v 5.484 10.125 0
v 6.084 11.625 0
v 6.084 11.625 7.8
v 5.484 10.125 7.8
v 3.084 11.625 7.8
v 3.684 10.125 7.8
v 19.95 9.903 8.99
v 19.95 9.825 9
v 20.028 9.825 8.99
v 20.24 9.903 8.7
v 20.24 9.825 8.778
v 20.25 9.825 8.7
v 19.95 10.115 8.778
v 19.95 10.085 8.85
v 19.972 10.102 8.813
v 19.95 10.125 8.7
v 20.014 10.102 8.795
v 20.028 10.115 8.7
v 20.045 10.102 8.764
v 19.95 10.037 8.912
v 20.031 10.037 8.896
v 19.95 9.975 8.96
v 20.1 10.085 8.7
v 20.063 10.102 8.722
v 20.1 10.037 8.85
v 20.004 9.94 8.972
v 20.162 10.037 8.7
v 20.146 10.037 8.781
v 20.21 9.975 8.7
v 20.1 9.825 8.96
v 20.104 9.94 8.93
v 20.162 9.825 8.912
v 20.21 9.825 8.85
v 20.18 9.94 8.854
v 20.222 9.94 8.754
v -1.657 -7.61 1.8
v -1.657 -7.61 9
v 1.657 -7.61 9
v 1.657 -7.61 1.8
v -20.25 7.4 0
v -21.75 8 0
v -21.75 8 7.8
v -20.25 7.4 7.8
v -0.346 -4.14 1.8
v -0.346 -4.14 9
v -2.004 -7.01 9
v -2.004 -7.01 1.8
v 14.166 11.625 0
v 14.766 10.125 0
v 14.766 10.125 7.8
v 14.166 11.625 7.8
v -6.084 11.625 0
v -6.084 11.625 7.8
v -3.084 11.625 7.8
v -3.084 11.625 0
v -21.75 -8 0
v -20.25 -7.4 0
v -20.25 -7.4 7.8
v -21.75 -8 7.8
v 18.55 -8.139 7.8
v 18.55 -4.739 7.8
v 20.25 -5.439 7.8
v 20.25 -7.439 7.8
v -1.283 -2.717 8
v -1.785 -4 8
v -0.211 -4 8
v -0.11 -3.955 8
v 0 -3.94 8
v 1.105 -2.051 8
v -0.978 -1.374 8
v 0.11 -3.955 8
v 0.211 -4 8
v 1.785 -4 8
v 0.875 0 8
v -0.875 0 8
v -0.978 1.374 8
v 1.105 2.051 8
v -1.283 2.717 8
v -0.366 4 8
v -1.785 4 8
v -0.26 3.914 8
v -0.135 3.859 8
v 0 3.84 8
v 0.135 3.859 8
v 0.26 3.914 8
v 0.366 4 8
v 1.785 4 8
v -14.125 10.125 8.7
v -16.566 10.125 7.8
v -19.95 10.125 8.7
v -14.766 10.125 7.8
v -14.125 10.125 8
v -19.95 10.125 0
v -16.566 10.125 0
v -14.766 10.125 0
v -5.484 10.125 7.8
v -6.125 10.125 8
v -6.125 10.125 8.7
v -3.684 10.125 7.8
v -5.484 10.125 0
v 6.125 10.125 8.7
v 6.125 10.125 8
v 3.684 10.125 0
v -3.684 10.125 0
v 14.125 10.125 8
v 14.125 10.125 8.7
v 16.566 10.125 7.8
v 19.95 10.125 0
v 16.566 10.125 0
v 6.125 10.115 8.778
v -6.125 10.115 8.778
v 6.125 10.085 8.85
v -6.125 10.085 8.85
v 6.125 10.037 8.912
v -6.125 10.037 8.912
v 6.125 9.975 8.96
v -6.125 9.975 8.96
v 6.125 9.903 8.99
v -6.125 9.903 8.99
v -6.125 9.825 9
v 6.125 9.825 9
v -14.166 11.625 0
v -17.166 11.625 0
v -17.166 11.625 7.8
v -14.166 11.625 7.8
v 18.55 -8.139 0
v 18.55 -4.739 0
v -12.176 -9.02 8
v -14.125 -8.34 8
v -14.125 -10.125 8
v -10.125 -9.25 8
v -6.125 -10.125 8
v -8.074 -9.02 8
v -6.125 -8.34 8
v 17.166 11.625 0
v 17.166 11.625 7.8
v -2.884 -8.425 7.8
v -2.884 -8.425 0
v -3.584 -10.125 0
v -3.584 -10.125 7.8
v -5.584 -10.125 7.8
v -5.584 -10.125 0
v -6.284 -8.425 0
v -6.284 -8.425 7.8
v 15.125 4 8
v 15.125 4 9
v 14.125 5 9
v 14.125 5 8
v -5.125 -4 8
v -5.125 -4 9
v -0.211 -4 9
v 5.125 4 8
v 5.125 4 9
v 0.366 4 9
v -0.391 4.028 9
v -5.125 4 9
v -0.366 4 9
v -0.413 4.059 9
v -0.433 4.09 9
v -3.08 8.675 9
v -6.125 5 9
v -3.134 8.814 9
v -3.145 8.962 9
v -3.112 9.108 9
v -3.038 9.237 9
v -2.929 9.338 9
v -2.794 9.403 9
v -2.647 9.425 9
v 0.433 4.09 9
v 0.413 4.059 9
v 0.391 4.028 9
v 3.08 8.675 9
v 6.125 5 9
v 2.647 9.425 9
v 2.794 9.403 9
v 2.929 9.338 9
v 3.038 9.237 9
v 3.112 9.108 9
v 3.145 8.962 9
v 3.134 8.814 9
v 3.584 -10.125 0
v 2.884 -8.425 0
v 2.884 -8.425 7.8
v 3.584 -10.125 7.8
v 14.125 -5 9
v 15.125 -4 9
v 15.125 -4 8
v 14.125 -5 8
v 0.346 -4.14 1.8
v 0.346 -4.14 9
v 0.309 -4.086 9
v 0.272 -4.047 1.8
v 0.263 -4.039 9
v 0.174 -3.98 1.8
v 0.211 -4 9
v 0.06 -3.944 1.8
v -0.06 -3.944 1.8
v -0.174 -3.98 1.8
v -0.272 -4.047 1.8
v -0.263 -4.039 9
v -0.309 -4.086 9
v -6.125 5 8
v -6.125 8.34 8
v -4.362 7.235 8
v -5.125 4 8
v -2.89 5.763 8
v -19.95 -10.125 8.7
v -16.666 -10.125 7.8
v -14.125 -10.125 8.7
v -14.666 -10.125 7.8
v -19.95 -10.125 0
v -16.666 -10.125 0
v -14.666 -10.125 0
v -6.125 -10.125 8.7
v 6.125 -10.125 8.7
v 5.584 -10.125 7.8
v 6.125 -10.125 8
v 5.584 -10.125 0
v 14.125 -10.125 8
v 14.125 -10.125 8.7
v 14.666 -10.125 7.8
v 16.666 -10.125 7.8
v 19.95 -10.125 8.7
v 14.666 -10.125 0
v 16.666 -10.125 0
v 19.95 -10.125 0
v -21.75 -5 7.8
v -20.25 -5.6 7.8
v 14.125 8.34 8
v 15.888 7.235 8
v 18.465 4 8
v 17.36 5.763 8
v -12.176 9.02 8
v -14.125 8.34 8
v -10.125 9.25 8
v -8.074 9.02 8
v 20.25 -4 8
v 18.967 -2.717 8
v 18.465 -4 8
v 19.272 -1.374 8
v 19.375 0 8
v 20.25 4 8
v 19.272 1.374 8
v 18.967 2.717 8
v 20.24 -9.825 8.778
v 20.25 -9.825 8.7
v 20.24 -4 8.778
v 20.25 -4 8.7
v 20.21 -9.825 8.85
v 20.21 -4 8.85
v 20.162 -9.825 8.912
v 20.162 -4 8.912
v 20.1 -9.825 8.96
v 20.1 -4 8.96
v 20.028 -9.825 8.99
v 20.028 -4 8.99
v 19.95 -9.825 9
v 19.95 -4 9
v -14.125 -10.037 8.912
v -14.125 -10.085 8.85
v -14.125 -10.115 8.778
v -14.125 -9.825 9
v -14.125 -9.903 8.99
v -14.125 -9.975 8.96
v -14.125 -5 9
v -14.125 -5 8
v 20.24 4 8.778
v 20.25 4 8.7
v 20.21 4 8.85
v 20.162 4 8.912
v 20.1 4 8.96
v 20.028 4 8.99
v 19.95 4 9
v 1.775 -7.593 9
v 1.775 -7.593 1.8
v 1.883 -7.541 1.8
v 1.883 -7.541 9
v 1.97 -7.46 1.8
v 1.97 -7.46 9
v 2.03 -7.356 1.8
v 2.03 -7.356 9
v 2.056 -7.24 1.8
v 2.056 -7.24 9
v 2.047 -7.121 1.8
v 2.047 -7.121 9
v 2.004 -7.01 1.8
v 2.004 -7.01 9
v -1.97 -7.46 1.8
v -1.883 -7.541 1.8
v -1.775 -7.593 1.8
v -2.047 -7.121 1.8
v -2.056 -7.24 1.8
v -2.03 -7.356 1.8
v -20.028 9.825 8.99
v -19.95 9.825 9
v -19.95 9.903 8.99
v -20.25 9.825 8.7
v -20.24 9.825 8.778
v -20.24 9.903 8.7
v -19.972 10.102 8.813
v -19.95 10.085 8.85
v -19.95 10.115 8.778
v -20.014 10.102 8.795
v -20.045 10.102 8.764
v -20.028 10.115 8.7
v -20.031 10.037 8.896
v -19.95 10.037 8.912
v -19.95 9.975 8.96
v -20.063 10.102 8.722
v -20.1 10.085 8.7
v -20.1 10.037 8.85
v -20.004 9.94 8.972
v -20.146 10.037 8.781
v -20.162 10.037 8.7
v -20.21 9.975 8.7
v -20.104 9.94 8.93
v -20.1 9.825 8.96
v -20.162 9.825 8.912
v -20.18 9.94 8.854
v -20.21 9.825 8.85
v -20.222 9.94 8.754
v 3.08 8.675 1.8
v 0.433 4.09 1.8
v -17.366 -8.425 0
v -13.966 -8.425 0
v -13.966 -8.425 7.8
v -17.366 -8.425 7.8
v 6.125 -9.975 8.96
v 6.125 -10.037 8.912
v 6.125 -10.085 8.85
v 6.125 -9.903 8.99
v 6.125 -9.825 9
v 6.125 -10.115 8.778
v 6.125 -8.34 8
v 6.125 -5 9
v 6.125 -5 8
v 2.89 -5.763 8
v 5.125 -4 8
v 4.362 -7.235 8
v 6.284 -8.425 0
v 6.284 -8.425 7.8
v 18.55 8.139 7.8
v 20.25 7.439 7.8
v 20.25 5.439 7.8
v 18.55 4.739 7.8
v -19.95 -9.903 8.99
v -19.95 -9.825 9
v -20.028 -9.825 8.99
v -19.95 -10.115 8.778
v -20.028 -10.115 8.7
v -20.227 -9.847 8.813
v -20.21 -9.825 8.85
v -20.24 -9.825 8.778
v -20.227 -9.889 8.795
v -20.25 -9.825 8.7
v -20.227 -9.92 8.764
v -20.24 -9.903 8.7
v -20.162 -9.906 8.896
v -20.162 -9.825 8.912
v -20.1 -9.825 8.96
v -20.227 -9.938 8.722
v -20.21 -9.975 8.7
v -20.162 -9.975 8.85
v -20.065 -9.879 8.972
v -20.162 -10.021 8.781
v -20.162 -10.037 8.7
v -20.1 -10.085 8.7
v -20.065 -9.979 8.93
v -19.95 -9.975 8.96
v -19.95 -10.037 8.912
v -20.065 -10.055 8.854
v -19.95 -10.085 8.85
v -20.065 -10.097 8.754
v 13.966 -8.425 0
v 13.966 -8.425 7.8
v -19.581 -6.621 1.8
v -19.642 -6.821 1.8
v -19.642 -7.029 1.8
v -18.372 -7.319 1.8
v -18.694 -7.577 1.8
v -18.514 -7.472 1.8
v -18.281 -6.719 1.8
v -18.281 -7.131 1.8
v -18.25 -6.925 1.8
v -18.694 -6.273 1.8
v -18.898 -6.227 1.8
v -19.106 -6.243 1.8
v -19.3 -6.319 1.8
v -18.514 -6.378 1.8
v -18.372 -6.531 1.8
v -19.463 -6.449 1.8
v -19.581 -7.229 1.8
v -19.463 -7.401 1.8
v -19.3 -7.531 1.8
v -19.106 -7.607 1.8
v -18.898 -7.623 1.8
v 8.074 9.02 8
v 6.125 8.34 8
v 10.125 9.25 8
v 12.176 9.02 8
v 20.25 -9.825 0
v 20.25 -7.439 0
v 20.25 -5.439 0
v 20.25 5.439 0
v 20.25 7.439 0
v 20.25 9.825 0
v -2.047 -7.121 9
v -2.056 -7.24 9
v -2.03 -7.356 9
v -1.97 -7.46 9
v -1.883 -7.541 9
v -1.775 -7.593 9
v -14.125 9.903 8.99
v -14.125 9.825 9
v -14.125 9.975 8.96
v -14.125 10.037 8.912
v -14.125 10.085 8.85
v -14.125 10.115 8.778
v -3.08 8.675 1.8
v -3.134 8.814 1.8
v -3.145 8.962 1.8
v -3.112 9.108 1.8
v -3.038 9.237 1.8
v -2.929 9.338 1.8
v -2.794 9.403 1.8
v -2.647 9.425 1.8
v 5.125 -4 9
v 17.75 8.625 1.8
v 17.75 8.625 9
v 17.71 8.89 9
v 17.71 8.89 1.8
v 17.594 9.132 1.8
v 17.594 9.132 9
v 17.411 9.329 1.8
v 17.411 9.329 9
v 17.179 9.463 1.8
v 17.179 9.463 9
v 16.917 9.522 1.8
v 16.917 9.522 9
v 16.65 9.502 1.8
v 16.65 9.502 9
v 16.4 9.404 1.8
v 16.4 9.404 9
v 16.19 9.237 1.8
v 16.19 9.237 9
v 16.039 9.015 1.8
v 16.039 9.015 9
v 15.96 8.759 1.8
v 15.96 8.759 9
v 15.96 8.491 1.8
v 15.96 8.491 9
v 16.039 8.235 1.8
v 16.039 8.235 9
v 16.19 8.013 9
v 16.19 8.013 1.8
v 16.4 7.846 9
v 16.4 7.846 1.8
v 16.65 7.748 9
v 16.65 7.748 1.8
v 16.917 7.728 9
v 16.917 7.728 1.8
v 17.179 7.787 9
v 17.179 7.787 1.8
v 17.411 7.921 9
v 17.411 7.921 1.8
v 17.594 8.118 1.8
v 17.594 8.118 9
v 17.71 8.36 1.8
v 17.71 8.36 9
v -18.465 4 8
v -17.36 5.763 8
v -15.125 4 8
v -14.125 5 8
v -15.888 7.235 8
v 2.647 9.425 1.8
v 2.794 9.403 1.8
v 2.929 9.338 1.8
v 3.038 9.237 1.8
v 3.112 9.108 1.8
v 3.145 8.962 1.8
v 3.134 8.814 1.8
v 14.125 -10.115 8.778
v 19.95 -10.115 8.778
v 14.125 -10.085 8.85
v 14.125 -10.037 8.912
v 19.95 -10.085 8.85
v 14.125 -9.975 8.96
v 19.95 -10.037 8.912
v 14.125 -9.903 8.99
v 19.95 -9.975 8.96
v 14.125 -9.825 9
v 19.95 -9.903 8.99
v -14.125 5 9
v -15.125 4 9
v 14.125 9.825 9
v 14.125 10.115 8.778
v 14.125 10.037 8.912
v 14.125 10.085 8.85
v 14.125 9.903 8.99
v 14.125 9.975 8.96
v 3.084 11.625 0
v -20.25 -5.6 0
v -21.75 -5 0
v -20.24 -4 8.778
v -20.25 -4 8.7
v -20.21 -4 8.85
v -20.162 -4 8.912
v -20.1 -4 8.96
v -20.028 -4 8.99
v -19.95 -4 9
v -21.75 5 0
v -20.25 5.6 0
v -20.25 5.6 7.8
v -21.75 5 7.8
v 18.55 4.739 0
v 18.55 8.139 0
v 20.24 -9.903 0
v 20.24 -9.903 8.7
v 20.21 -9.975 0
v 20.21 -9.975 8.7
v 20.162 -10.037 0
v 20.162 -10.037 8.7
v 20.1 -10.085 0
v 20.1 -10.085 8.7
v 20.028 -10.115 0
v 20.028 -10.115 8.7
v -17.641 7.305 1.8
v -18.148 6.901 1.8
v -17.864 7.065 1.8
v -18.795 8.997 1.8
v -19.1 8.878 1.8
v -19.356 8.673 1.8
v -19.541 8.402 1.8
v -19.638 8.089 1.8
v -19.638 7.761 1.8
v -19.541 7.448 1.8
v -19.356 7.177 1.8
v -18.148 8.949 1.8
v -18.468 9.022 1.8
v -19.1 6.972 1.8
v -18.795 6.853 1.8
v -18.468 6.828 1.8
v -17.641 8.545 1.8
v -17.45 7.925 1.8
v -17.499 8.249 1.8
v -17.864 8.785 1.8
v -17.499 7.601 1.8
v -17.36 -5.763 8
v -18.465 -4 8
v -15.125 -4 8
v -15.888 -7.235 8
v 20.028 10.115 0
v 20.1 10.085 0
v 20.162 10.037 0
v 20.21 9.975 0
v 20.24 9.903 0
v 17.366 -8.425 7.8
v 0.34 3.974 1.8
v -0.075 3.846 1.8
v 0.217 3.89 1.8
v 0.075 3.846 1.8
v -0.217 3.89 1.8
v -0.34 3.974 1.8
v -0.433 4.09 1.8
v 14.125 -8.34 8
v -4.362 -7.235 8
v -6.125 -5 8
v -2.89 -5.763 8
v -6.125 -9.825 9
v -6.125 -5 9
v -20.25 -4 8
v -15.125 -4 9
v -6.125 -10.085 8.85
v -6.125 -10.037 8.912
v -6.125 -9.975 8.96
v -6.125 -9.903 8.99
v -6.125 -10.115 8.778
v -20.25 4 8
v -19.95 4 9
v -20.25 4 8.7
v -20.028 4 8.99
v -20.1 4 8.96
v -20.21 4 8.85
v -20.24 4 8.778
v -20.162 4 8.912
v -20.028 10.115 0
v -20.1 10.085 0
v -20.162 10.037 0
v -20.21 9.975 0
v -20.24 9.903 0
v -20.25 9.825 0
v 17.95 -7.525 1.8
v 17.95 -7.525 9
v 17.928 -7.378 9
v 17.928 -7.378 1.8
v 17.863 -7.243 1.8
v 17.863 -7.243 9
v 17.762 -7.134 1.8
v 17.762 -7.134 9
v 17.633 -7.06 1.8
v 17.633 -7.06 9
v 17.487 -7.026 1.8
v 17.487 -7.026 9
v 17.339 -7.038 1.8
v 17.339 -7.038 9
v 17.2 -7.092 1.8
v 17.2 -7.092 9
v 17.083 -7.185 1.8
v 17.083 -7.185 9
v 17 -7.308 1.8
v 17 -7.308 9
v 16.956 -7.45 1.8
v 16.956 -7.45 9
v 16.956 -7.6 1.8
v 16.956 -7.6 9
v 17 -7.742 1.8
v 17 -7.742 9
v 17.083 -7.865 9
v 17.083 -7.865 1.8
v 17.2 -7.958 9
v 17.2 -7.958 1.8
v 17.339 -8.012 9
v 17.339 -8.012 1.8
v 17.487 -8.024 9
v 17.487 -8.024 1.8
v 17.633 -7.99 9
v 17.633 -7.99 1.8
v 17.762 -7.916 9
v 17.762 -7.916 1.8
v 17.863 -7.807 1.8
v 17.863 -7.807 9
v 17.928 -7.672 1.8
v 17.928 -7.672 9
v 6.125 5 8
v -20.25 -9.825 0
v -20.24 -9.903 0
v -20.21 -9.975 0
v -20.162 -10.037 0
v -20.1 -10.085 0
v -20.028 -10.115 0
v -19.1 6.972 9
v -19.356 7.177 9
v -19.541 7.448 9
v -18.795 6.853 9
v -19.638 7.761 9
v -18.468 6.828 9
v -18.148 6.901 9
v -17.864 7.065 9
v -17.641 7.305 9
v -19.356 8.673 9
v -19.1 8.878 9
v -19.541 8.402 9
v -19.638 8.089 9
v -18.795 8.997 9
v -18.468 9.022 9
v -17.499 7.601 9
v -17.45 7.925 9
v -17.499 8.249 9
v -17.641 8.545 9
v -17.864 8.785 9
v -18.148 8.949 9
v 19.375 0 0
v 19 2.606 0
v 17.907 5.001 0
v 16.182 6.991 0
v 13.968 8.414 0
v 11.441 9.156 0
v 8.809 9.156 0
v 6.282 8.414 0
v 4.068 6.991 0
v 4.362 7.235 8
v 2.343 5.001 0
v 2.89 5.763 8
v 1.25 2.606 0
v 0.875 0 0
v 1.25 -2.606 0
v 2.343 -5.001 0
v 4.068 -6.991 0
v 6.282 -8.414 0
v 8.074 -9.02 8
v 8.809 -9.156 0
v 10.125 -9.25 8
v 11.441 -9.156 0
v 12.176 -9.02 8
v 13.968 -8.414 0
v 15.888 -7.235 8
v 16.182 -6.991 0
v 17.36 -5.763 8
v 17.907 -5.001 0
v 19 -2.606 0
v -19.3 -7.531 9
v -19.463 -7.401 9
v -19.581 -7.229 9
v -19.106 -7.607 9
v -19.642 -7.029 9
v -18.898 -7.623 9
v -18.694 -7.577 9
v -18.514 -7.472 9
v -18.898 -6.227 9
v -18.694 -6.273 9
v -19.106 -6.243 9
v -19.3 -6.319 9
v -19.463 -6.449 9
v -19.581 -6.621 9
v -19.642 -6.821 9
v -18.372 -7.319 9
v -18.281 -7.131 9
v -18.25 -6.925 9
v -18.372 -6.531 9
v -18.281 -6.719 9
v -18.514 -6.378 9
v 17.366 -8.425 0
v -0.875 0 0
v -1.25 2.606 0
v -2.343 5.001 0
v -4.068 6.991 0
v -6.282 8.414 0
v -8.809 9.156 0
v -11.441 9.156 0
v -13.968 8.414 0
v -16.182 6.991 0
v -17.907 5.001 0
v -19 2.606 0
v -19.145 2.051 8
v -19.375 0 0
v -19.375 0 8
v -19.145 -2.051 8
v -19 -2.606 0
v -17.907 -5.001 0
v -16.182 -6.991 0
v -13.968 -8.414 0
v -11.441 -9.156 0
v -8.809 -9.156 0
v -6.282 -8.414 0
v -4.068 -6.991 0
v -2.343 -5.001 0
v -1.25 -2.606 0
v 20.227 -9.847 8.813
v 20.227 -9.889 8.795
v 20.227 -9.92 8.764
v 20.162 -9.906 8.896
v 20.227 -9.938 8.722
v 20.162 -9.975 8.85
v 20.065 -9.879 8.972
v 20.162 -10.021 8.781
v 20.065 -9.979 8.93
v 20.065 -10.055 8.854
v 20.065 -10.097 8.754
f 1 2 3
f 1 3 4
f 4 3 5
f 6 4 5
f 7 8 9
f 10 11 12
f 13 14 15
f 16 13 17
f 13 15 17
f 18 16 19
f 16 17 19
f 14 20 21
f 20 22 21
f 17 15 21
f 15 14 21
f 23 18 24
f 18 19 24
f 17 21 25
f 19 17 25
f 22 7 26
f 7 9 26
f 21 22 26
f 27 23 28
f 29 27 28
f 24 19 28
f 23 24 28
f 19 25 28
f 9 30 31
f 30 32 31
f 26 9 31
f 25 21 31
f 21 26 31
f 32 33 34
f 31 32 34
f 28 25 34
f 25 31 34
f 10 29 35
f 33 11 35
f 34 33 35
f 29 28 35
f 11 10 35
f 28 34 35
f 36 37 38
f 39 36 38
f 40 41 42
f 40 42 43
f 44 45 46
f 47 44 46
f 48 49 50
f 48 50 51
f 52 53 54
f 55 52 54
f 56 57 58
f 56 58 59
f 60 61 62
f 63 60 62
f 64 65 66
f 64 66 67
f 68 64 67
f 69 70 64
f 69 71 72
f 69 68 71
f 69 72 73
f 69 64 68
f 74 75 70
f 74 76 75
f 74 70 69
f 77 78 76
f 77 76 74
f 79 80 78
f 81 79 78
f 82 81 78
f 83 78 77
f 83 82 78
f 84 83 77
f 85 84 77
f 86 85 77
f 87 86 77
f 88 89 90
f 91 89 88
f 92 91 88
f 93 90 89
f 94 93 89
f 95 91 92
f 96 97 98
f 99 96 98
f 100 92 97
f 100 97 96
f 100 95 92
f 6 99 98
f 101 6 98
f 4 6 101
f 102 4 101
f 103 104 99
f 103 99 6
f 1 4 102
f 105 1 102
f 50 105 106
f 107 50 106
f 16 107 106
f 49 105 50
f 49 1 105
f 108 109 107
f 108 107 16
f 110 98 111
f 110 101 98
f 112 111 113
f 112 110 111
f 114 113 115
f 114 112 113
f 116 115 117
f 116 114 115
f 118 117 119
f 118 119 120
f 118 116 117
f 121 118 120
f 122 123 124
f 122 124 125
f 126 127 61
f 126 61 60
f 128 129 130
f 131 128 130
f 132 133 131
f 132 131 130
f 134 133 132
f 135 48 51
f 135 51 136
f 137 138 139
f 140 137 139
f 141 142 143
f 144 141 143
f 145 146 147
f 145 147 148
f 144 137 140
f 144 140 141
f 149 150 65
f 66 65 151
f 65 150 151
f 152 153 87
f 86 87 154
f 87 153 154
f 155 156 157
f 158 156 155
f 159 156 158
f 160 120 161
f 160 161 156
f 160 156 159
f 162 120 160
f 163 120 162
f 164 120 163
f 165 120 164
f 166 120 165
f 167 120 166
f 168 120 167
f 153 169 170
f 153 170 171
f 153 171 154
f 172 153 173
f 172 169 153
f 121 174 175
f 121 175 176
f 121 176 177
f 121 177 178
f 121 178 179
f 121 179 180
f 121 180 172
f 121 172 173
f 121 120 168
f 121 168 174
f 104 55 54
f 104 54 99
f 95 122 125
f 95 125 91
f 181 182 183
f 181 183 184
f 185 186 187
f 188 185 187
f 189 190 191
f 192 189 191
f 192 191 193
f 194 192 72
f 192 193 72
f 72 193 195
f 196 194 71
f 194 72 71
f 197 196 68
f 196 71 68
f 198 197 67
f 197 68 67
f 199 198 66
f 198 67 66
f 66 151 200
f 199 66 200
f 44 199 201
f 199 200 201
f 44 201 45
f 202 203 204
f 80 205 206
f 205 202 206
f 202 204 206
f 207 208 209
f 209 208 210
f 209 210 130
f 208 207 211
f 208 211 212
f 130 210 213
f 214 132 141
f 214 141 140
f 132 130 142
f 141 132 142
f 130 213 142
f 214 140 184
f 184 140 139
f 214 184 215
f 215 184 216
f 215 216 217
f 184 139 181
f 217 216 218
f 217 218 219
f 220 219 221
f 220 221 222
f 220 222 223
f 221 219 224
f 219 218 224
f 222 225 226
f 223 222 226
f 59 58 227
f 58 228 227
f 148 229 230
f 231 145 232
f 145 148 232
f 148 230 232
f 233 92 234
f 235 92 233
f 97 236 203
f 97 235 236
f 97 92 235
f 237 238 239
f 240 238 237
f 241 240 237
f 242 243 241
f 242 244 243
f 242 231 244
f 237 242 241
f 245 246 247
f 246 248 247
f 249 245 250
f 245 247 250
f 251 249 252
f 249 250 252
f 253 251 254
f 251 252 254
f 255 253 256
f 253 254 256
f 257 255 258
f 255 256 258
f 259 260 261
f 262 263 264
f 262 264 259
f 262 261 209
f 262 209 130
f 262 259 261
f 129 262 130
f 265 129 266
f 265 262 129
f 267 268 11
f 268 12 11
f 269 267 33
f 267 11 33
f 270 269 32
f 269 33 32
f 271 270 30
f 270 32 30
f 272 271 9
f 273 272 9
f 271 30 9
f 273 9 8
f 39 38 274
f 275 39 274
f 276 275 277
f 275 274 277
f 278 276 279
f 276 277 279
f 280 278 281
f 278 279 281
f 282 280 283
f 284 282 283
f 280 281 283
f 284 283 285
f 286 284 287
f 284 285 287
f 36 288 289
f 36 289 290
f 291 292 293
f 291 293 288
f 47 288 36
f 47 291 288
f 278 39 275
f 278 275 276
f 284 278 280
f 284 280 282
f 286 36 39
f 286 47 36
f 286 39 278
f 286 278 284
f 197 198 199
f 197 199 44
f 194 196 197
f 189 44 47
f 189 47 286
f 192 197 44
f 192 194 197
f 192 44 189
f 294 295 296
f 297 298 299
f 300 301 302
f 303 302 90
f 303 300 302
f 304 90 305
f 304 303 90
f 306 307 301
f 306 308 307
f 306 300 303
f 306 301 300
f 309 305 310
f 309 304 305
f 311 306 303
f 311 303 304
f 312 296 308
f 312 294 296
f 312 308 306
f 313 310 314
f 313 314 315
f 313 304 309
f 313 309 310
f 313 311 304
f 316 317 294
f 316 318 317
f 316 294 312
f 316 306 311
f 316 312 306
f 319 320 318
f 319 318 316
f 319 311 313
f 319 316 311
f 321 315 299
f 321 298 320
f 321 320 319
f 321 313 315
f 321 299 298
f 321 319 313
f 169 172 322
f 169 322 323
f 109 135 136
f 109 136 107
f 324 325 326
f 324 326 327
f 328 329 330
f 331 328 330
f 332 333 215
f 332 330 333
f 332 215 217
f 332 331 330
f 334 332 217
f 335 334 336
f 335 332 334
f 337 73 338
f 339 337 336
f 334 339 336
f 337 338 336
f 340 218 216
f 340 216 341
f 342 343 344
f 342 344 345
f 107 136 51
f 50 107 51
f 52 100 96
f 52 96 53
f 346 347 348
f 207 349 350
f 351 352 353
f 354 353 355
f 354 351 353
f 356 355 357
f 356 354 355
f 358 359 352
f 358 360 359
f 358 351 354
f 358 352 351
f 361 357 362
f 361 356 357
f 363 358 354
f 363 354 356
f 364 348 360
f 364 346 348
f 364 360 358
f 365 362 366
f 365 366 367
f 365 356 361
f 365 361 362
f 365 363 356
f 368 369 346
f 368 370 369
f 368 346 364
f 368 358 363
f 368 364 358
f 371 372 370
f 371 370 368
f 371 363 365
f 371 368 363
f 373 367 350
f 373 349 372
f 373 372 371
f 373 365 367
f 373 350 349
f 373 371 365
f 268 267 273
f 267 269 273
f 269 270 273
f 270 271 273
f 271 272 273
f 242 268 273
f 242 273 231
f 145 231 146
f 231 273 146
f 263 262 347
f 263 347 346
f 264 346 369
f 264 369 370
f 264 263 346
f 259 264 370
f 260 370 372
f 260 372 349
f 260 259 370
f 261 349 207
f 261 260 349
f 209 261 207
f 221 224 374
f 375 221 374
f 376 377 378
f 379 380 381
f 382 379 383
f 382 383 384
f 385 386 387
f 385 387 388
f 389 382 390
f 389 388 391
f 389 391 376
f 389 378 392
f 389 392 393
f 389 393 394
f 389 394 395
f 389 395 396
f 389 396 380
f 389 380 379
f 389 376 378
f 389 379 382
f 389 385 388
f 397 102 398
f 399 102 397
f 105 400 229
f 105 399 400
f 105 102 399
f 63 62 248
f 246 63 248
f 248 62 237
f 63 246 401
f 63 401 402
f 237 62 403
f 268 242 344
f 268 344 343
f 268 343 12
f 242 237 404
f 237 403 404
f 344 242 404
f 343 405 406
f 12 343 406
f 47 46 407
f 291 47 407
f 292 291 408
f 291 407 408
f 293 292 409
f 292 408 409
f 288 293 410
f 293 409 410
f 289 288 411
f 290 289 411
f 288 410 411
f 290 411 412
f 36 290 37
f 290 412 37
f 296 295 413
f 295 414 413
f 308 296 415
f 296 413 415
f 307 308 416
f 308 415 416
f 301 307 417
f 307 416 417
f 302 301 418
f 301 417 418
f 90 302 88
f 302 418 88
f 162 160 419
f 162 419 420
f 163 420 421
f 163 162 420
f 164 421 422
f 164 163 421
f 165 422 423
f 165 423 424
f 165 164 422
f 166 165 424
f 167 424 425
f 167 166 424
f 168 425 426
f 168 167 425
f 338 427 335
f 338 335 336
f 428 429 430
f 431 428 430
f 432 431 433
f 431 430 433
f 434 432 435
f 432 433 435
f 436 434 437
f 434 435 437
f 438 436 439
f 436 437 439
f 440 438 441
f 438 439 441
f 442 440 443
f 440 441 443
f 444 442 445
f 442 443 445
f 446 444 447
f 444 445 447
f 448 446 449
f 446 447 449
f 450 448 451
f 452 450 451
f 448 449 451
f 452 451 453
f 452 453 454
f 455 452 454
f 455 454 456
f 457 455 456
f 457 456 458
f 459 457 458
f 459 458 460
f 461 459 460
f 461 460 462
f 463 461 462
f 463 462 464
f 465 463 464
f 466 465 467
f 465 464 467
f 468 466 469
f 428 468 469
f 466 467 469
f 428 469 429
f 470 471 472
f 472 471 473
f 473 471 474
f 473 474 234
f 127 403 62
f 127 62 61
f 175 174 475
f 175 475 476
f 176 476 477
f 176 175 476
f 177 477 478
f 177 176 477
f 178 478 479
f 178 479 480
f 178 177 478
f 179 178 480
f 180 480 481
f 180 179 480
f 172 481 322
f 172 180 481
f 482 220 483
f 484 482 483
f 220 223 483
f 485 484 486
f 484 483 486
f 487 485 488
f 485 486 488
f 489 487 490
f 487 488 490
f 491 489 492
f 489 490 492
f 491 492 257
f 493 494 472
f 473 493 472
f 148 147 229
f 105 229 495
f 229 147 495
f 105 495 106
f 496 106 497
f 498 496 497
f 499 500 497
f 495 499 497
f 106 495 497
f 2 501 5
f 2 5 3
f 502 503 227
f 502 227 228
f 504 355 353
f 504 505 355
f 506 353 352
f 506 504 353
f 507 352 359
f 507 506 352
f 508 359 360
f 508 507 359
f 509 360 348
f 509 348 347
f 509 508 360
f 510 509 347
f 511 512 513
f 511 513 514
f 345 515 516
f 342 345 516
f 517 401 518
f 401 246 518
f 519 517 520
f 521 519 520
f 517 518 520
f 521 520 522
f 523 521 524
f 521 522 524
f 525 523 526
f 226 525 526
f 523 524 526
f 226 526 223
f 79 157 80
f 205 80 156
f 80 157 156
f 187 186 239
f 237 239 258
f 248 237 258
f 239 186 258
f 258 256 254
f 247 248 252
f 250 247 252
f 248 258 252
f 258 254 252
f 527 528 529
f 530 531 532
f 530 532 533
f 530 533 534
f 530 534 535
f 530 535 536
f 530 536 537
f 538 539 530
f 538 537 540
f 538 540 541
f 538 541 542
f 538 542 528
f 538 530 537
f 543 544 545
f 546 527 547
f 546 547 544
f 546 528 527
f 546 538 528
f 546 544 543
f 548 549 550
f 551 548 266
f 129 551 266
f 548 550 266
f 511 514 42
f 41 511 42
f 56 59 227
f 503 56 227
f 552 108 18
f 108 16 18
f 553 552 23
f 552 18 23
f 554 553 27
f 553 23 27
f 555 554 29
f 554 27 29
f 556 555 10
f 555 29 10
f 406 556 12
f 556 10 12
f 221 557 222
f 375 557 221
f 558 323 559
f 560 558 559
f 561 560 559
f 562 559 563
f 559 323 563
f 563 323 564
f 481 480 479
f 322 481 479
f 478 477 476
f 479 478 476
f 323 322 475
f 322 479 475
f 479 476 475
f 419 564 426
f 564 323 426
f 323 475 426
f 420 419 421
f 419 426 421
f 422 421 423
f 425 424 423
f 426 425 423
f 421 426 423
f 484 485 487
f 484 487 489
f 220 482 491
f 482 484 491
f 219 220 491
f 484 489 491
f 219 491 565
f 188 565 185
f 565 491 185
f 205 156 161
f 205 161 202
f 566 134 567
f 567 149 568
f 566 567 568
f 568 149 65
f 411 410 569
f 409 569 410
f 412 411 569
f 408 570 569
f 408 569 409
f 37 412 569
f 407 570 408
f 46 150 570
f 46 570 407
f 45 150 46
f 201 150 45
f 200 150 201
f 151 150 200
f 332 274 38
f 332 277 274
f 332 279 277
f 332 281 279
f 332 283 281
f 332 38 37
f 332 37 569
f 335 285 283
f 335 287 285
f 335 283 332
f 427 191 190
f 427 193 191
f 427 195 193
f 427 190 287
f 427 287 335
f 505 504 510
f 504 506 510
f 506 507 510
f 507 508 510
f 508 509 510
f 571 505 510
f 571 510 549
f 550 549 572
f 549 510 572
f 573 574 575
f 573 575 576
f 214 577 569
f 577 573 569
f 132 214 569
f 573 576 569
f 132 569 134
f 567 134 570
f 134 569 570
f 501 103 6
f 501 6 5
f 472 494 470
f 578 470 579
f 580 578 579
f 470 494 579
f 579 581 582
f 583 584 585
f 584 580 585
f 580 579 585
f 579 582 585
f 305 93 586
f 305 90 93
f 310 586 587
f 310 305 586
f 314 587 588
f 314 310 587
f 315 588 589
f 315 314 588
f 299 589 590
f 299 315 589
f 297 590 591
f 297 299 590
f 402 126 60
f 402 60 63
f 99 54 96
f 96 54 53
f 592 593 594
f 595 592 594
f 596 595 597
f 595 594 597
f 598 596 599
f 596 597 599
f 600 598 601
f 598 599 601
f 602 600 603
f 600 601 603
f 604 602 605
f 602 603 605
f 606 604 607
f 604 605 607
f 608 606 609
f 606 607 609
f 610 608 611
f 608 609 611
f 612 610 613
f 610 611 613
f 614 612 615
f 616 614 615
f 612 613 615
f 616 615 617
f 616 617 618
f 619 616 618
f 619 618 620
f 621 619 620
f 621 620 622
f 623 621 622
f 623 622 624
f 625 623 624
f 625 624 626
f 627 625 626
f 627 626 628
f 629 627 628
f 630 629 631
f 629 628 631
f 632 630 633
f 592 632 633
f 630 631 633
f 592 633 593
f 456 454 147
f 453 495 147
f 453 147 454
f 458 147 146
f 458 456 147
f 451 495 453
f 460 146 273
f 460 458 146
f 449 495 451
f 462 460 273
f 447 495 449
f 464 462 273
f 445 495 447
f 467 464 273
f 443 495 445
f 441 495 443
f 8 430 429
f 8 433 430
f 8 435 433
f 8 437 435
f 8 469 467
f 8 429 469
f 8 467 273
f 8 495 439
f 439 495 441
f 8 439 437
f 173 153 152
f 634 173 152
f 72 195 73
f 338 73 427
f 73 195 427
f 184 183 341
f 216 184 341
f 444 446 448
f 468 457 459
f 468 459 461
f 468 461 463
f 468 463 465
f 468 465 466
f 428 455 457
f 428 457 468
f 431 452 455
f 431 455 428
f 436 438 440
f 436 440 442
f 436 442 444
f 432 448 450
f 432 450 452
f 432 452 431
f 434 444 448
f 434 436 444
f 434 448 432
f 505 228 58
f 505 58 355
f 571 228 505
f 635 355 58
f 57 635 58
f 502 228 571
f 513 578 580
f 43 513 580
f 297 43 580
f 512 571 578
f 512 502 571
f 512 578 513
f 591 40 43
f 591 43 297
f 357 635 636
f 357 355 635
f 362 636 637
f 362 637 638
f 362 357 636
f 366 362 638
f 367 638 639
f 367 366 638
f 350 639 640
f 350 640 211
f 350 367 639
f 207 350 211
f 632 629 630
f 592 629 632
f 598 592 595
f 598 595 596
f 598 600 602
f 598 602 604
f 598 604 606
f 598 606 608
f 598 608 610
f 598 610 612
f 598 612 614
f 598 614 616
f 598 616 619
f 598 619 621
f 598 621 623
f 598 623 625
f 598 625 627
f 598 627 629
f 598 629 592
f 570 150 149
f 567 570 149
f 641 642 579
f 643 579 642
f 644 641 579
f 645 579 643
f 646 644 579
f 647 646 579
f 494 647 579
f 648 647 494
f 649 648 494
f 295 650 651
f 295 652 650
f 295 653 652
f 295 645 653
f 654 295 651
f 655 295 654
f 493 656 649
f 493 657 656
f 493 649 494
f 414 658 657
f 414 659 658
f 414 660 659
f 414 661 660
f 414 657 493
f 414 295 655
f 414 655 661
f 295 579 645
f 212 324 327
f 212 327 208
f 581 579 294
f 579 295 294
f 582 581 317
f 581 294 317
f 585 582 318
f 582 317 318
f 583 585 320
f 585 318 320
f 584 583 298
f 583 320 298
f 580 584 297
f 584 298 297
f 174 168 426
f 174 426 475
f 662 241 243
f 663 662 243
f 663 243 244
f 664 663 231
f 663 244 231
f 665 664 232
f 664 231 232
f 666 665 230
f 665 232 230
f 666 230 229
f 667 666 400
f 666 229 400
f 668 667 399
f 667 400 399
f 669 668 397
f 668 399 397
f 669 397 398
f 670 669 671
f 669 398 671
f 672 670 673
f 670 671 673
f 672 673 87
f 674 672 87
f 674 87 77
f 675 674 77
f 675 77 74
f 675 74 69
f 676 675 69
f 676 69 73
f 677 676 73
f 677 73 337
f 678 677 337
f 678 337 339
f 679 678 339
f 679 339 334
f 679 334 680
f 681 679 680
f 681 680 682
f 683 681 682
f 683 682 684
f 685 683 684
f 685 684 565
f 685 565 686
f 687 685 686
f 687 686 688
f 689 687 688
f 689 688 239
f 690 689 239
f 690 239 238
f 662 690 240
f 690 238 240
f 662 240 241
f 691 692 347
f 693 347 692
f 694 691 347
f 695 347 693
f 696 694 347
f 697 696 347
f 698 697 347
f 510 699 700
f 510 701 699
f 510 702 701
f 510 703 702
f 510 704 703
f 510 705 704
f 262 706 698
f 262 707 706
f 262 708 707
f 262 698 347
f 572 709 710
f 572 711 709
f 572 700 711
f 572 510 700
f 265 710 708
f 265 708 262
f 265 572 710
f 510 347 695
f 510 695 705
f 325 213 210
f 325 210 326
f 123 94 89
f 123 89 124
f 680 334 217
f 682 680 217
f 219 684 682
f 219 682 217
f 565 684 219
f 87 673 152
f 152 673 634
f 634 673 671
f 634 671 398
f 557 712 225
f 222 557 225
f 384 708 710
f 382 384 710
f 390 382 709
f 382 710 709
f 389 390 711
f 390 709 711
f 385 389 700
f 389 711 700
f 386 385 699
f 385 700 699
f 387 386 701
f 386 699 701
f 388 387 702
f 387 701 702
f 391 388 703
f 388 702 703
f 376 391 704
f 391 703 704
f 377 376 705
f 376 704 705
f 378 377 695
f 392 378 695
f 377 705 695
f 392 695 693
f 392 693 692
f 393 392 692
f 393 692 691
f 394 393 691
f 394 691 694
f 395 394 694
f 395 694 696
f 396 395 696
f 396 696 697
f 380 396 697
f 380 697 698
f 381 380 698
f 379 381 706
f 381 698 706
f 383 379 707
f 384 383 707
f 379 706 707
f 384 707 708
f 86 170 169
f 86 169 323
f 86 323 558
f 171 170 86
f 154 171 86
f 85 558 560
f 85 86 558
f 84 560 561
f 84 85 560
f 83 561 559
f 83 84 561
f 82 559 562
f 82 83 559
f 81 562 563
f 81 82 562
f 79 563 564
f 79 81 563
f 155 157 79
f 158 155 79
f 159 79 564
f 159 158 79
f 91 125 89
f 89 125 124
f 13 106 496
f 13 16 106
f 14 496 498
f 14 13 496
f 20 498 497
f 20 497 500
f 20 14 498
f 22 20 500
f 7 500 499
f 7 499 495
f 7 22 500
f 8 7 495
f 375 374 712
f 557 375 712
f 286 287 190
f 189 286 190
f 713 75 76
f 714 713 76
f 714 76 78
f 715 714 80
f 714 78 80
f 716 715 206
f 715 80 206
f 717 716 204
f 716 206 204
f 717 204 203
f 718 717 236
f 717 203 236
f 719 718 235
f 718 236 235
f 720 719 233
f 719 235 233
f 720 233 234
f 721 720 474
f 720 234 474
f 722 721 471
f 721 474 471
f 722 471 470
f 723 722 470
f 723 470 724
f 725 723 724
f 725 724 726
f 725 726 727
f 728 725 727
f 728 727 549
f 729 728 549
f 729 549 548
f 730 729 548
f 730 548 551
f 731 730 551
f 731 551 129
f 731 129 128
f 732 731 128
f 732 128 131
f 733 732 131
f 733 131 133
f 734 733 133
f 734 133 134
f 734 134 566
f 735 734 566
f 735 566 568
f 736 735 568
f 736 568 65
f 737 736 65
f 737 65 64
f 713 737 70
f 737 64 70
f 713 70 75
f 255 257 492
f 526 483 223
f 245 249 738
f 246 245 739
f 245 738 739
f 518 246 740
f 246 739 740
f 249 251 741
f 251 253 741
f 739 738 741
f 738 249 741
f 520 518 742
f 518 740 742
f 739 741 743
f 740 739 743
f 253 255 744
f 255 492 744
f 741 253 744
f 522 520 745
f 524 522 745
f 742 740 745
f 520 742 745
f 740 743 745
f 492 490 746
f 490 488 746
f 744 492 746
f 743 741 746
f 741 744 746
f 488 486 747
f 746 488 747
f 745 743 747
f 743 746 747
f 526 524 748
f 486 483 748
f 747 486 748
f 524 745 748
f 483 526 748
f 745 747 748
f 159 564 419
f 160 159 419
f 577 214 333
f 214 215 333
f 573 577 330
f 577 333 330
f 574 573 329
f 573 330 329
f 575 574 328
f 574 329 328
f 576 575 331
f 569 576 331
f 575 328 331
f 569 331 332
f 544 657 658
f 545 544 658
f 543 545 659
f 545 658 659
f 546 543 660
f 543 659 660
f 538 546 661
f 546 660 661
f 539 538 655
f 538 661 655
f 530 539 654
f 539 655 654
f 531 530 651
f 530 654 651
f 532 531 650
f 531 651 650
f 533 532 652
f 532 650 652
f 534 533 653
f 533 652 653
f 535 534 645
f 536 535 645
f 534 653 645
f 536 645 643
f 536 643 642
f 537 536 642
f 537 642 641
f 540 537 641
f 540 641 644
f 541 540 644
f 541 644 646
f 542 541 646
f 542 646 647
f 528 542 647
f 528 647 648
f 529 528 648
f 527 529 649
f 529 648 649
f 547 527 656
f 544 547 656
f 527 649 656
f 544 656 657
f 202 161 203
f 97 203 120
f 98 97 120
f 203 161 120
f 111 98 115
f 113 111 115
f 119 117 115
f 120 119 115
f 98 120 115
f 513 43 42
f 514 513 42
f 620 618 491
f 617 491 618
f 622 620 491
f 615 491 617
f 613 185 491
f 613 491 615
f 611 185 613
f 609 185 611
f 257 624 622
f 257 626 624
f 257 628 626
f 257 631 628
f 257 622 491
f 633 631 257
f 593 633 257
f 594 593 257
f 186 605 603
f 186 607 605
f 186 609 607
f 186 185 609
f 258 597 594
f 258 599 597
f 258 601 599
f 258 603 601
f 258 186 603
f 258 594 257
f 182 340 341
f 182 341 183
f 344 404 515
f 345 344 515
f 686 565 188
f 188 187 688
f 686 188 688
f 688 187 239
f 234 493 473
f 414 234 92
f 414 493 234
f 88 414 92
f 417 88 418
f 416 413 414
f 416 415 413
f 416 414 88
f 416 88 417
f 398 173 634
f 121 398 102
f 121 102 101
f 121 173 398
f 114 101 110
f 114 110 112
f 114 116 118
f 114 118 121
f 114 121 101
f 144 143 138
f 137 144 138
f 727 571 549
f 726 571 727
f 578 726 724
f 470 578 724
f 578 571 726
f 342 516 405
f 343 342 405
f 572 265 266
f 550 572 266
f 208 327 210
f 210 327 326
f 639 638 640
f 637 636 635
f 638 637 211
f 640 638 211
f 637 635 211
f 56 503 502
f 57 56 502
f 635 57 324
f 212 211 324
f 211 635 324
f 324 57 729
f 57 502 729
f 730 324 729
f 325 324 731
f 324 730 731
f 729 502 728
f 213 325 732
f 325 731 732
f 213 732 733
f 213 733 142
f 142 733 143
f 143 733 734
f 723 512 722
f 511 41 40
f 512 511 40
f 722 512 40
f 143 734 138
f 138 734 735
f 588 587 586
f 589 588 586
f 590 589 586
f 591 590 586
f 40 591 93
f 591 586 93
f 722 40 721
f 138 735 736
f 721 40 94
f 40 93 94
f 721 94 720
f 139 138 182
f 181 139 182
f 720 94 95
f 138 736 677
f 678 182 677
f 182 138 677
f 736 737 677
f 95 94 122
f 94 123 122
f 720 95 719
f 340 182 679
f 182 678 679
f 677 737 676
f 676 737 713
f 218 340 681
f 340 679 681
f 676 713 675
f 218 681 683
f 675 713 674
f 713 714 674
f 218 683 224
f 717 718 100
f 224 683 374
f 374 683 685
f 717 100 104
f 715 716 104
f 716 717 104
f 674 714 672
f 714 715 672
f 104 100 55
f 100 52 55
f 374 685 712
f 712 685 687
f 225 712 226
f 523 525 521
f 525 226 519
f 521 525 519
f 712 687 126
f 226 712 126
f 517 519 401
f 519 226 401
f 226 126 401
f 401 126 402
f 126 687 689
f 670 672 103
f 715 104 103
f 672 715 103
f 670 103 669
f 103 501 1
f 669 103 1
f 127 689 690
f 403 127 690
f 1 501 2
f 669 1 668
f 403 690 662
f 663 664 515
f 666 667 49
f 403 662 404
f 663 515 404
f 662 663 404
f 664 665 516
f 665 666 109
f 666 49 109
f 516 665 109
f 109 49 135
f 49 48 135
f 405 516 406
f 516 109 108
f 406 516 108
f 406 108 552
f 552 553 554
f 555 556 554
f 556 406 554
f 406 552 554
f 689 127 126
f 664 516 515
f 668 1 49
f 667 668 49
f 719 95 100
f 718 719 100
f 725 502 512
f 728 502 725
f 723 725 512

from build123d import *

# Parameters (mm, degrees)
SKETCH_1_W          = 40.5
SKETCH_1_H          = 20.25
EXTRUDE_1_DEPTH     = 9
CUT_EXTRUDE_START   = -1
SKETCH_2_R          = 9.25
CUT_EXTRUDE_1_DEPTH = 9
SKETCH_3_W          = 6.125
SKETCH_3_H          = 8
SKETCH_3_W_2        = 8
SKETCH_3_W_3        = 12.25
SKETCH_3_H_2        = 6.125
CUT_EXTRUDE_2_DEPTH = 1
CHAMFER_1_SIZE      = 1
SKETCH_4_R          = 1.1
SKETCH_4_R_2        = 0.7
SKETCH_4_R_3        = 0.9
SKETCH_4_R_4        = 0.5
CUT_EXTRUDE_3_DEPTH = 7.2
EXTRUDE_2_DEPTH     = 7.8
CUT_EXTRUDE_4_DEPTH = 7.8
FILLET_1_R          = 0.3


with BuildPart() as part:
    # Эскиз1 → Бобышка-Вытянуть1 (new body)
    with BuildSketch(Plane.XY):
        Rectangle(SKETCH_1_W, SKETCH_1_H)
    extrude(amount=EXTRUDE_1_DEPTH)

    # Эскиз2 → Вырез-Вытянуть1 (cut)
    with BuildSketch(Plane.XY.offset(9).offset(CUT_EXTRUDE_START)):
        with Locations((-10.125, 0)):
            Circle(SKETCH_2_R)
        with Locations((10.125, 0)):
            Circle(SKETCH_2_R)
    extrude(amount=-CUT_EXTRUDE_1_DEPTH, mode=Mode.SUBTRACT)

    # Эскиз3 → Вырез-Вытянуть2 (cut)
    with BuildSketch(Plane.XY.offset(9)):
        with Locations((-17.1875, 0)):
            Rectangle(SKETCH_3_W, SKETCH_3_H)
        with Locations((-10.125, 0)):
            Rectangle(SKETCH_3_W_2, SKETCH_3_H)
        Rectangle(SKETCH_3_W_3, SKETCH_3_H)
        with Locations((10.125, 0)):
            Rectangle(SKETCH_3_W_2, SKETCH_3_H)
        with Locations((17.1875, 0)):
            Rectangle(SKETCH_3_W, SKETCH_3_H)
        with Locations((10.125, 7.0625)):
            Rectangle(SKETCH_3_W_2, SKETCH_3_H_2)
        with Locations((-10.125, 7.0625)):
            Rectangle(SKETCH_3_W_2, SKETCH_3_H_2)
        with Locations((-10.125, -7.0625)):
            Rectangle(SKETCH_3_W_2, SKETCH_3_H_2)
        with Locations((10.125, -7.0625)):
            Rectangle(SKETCH_3_W_2, SKETCH_3_H_2)
    extrude(amount=-CUT_EXTRUDE_2_DEPTH, mode=Mode.SUBTRACT)

    # Фаска1
    chamfer_1_edges = [part.edges().sort_by_distance(p)[0] for p in [
        (-14.125, 4, 8.5),
        (-6.125, 4, 8.5),
        (6.125, 4, 8.5),
        (14.125, 4, 8.5),
        (14.125, -4, 8.5),
        (6.125, -4, 8.5),
        (-6.125, -4, 8.5),
        (-14.125, -4, 8.5),
    ]]
    chamfer(chamfer_1_edges, length=CHAMFER_1_SIZE)

    # Эскиз4 → Вырез-Вытянуть3 (cut)
    with BuildSketch(Plane.XY.offset(9)):
        with Locations((-18.55, 7.925)):
            Circle(SKETCH_4_R)
        with Locations((-18.95, -6.925)):
            Circle(SKETCH_4_R_2)
        with Locations((16.85, 8.625)):
            Circle(SKETCH_4_R_3)
        with Locations((17.45, -7.525)):
            Circle(SKETCH_4_R_4)
        with BuildLine():
            Line((3.079897776, 8.675), (0.433012702, 4.09046057))
            ThreePointArc((0.433012702, 4.09046057), (0, 3.84046057), (-0.433012702, 4.09046057))
            Line((-0.433012702, 4.09046057), (-3.079897776, 8.675))
            ThreePointArc((-3.079897776, 8.675), (-3.079897776, 9.175), (-2.646885074, 9.425))
            Line((-2.646885074, 9.425), (2.646885074, 9.425))
            ThreePointArc((2.646885074, 9.425), (3.079897776, 9.175), (3.079897776, 8.675))
        make_face()
        with BuildLine():
            Line((-0.346410162, -4.14), (-2.003589838, -7.010319398))
            ThreePointArc((-2.003589838, -7.010319398), (-2.003589838, -7.410319398), (-1.657179677, -7.610319398))
            Line((-1.657179677, -7.610319398), (1.657179677, -7.610319398))
            ThreePointArc((1.657179677, -7.610319398), (2.003589838, -7.410319398), (2.003589838, -7.010319398))
            Line((2.003589838, -7.010319398), (0.346410162, -4.14))
            ThreePointArc((0.346410162, -4.14), (0, -3.94), (-0.346410162, -4.14))
        make_face()
    extrude(amount=-CUT_EXTRUDE_3_DEPTH, mode=Mode.SUBTRACT)

    # Эскиз5 → Бобышка-Вытянуть2 (add)
    with BuildSketch(Plane(origin=(0, 0, 0), x_dir=(-1, 0, 0), z_dir=(0, 0, -1))):
        Polygon((-14.165851779, 11.625), (-17.165851779, 11.625), (-16.565851779, 10.125), (-14.765851779, 10.125), align=None)
        Polygon((-6.084148221, 11.625), (-5.484148221, 10.125), (-3.684148221, 10.125), (-3.084148221, 11.625), align=None)
        Polygon((6.084148221, 11.625), (3.084148221, 11.625), (3.684148221, 10.125), (5.484148221, 10.125), align=None)
        Polygon((14.165851779, 11.625), (14.765851779, 10.125), (16.565851779, 10.125), (17.165851779, 11.625), align=None)
        Polygon((20.25, 7.4), (20.25, 5.6), (21.75, 5), (21.75, 8), align=None)
        Polygon((20.25, -7.4), (21.75, -8), (21.75, -5), (20.25, -5.6), align=None)
    extrude(amount=-EXTRUDE_2_DEPTH)

    # Эскиз6 → Вырез-Вытянуть4 (cut)
    with BuildSketch(Plane(origin=(0, 0, 0), x_dir=(-1, 0, 0), z_dir=(0, 0, -1))):
        Polygon((17.365851779, -8.425), (16.665851779, -10.125), (14.665851779, -10.125), (13.965851779, -8.425), align=None)
        Polygon((6.284148221, -8.425), (2.884148221, -8.425), (3.584148221, -10.125), (5.584148221, -10.125), align=None)
        Polygon((-16.665851779, -10.125), (-14.665851779, -10.125), (-13.965851779, -8.425), (-17.365851779, -8.425), align=None)
        Polygon((-2.884148221, -8.425), (-3.584148221, -10.125), (-5.584148221, -10.125), (-6.284148221, -8.425), align=None)
        Polygon((-18.55, -4.739111724), (-18.55, -8.139111724), (-20.25, -7.439111724), (-20.25, -5.439111724), align=None)
        Polygon((-18.55, 8.139111724), (-20.25, 7.439111724), (-20.25, 5.439111724), (-18.55, 4.739111724), align=None)
    extrude(amount=-CUT_EXTRUDE_4_DEPTH, mode=Mode.SUBTRACT)

    # Скругление1
    fillet_1_edges = [part.edges().sort_by_distance(p)[0] for p in [
        (-20.25, 7.0625, 9),
        (-17.1875, -10.125, 9),
        (20.25, 7.0625, 9),
        (0, 10.125, 9),
        (-17.1875, 10.125, 9),
        (-20.25, -7.0625, 9),
        (0, -10.125, 9),
        (17.1875, -10.125, 9),
        (20.25, -7.0625, 9),
        (17.1875, 10.125, 9),
        (20.25, -10.125, 4.5),
        (-20.25, -10.125, 4.5),
        (-20.25, 10.125, 4.5),
        (20.25, 10.125, 4.5),
    ]]
    fillet(fillet_1_edges, radius=FILLET_1_R)


solid = part.part
